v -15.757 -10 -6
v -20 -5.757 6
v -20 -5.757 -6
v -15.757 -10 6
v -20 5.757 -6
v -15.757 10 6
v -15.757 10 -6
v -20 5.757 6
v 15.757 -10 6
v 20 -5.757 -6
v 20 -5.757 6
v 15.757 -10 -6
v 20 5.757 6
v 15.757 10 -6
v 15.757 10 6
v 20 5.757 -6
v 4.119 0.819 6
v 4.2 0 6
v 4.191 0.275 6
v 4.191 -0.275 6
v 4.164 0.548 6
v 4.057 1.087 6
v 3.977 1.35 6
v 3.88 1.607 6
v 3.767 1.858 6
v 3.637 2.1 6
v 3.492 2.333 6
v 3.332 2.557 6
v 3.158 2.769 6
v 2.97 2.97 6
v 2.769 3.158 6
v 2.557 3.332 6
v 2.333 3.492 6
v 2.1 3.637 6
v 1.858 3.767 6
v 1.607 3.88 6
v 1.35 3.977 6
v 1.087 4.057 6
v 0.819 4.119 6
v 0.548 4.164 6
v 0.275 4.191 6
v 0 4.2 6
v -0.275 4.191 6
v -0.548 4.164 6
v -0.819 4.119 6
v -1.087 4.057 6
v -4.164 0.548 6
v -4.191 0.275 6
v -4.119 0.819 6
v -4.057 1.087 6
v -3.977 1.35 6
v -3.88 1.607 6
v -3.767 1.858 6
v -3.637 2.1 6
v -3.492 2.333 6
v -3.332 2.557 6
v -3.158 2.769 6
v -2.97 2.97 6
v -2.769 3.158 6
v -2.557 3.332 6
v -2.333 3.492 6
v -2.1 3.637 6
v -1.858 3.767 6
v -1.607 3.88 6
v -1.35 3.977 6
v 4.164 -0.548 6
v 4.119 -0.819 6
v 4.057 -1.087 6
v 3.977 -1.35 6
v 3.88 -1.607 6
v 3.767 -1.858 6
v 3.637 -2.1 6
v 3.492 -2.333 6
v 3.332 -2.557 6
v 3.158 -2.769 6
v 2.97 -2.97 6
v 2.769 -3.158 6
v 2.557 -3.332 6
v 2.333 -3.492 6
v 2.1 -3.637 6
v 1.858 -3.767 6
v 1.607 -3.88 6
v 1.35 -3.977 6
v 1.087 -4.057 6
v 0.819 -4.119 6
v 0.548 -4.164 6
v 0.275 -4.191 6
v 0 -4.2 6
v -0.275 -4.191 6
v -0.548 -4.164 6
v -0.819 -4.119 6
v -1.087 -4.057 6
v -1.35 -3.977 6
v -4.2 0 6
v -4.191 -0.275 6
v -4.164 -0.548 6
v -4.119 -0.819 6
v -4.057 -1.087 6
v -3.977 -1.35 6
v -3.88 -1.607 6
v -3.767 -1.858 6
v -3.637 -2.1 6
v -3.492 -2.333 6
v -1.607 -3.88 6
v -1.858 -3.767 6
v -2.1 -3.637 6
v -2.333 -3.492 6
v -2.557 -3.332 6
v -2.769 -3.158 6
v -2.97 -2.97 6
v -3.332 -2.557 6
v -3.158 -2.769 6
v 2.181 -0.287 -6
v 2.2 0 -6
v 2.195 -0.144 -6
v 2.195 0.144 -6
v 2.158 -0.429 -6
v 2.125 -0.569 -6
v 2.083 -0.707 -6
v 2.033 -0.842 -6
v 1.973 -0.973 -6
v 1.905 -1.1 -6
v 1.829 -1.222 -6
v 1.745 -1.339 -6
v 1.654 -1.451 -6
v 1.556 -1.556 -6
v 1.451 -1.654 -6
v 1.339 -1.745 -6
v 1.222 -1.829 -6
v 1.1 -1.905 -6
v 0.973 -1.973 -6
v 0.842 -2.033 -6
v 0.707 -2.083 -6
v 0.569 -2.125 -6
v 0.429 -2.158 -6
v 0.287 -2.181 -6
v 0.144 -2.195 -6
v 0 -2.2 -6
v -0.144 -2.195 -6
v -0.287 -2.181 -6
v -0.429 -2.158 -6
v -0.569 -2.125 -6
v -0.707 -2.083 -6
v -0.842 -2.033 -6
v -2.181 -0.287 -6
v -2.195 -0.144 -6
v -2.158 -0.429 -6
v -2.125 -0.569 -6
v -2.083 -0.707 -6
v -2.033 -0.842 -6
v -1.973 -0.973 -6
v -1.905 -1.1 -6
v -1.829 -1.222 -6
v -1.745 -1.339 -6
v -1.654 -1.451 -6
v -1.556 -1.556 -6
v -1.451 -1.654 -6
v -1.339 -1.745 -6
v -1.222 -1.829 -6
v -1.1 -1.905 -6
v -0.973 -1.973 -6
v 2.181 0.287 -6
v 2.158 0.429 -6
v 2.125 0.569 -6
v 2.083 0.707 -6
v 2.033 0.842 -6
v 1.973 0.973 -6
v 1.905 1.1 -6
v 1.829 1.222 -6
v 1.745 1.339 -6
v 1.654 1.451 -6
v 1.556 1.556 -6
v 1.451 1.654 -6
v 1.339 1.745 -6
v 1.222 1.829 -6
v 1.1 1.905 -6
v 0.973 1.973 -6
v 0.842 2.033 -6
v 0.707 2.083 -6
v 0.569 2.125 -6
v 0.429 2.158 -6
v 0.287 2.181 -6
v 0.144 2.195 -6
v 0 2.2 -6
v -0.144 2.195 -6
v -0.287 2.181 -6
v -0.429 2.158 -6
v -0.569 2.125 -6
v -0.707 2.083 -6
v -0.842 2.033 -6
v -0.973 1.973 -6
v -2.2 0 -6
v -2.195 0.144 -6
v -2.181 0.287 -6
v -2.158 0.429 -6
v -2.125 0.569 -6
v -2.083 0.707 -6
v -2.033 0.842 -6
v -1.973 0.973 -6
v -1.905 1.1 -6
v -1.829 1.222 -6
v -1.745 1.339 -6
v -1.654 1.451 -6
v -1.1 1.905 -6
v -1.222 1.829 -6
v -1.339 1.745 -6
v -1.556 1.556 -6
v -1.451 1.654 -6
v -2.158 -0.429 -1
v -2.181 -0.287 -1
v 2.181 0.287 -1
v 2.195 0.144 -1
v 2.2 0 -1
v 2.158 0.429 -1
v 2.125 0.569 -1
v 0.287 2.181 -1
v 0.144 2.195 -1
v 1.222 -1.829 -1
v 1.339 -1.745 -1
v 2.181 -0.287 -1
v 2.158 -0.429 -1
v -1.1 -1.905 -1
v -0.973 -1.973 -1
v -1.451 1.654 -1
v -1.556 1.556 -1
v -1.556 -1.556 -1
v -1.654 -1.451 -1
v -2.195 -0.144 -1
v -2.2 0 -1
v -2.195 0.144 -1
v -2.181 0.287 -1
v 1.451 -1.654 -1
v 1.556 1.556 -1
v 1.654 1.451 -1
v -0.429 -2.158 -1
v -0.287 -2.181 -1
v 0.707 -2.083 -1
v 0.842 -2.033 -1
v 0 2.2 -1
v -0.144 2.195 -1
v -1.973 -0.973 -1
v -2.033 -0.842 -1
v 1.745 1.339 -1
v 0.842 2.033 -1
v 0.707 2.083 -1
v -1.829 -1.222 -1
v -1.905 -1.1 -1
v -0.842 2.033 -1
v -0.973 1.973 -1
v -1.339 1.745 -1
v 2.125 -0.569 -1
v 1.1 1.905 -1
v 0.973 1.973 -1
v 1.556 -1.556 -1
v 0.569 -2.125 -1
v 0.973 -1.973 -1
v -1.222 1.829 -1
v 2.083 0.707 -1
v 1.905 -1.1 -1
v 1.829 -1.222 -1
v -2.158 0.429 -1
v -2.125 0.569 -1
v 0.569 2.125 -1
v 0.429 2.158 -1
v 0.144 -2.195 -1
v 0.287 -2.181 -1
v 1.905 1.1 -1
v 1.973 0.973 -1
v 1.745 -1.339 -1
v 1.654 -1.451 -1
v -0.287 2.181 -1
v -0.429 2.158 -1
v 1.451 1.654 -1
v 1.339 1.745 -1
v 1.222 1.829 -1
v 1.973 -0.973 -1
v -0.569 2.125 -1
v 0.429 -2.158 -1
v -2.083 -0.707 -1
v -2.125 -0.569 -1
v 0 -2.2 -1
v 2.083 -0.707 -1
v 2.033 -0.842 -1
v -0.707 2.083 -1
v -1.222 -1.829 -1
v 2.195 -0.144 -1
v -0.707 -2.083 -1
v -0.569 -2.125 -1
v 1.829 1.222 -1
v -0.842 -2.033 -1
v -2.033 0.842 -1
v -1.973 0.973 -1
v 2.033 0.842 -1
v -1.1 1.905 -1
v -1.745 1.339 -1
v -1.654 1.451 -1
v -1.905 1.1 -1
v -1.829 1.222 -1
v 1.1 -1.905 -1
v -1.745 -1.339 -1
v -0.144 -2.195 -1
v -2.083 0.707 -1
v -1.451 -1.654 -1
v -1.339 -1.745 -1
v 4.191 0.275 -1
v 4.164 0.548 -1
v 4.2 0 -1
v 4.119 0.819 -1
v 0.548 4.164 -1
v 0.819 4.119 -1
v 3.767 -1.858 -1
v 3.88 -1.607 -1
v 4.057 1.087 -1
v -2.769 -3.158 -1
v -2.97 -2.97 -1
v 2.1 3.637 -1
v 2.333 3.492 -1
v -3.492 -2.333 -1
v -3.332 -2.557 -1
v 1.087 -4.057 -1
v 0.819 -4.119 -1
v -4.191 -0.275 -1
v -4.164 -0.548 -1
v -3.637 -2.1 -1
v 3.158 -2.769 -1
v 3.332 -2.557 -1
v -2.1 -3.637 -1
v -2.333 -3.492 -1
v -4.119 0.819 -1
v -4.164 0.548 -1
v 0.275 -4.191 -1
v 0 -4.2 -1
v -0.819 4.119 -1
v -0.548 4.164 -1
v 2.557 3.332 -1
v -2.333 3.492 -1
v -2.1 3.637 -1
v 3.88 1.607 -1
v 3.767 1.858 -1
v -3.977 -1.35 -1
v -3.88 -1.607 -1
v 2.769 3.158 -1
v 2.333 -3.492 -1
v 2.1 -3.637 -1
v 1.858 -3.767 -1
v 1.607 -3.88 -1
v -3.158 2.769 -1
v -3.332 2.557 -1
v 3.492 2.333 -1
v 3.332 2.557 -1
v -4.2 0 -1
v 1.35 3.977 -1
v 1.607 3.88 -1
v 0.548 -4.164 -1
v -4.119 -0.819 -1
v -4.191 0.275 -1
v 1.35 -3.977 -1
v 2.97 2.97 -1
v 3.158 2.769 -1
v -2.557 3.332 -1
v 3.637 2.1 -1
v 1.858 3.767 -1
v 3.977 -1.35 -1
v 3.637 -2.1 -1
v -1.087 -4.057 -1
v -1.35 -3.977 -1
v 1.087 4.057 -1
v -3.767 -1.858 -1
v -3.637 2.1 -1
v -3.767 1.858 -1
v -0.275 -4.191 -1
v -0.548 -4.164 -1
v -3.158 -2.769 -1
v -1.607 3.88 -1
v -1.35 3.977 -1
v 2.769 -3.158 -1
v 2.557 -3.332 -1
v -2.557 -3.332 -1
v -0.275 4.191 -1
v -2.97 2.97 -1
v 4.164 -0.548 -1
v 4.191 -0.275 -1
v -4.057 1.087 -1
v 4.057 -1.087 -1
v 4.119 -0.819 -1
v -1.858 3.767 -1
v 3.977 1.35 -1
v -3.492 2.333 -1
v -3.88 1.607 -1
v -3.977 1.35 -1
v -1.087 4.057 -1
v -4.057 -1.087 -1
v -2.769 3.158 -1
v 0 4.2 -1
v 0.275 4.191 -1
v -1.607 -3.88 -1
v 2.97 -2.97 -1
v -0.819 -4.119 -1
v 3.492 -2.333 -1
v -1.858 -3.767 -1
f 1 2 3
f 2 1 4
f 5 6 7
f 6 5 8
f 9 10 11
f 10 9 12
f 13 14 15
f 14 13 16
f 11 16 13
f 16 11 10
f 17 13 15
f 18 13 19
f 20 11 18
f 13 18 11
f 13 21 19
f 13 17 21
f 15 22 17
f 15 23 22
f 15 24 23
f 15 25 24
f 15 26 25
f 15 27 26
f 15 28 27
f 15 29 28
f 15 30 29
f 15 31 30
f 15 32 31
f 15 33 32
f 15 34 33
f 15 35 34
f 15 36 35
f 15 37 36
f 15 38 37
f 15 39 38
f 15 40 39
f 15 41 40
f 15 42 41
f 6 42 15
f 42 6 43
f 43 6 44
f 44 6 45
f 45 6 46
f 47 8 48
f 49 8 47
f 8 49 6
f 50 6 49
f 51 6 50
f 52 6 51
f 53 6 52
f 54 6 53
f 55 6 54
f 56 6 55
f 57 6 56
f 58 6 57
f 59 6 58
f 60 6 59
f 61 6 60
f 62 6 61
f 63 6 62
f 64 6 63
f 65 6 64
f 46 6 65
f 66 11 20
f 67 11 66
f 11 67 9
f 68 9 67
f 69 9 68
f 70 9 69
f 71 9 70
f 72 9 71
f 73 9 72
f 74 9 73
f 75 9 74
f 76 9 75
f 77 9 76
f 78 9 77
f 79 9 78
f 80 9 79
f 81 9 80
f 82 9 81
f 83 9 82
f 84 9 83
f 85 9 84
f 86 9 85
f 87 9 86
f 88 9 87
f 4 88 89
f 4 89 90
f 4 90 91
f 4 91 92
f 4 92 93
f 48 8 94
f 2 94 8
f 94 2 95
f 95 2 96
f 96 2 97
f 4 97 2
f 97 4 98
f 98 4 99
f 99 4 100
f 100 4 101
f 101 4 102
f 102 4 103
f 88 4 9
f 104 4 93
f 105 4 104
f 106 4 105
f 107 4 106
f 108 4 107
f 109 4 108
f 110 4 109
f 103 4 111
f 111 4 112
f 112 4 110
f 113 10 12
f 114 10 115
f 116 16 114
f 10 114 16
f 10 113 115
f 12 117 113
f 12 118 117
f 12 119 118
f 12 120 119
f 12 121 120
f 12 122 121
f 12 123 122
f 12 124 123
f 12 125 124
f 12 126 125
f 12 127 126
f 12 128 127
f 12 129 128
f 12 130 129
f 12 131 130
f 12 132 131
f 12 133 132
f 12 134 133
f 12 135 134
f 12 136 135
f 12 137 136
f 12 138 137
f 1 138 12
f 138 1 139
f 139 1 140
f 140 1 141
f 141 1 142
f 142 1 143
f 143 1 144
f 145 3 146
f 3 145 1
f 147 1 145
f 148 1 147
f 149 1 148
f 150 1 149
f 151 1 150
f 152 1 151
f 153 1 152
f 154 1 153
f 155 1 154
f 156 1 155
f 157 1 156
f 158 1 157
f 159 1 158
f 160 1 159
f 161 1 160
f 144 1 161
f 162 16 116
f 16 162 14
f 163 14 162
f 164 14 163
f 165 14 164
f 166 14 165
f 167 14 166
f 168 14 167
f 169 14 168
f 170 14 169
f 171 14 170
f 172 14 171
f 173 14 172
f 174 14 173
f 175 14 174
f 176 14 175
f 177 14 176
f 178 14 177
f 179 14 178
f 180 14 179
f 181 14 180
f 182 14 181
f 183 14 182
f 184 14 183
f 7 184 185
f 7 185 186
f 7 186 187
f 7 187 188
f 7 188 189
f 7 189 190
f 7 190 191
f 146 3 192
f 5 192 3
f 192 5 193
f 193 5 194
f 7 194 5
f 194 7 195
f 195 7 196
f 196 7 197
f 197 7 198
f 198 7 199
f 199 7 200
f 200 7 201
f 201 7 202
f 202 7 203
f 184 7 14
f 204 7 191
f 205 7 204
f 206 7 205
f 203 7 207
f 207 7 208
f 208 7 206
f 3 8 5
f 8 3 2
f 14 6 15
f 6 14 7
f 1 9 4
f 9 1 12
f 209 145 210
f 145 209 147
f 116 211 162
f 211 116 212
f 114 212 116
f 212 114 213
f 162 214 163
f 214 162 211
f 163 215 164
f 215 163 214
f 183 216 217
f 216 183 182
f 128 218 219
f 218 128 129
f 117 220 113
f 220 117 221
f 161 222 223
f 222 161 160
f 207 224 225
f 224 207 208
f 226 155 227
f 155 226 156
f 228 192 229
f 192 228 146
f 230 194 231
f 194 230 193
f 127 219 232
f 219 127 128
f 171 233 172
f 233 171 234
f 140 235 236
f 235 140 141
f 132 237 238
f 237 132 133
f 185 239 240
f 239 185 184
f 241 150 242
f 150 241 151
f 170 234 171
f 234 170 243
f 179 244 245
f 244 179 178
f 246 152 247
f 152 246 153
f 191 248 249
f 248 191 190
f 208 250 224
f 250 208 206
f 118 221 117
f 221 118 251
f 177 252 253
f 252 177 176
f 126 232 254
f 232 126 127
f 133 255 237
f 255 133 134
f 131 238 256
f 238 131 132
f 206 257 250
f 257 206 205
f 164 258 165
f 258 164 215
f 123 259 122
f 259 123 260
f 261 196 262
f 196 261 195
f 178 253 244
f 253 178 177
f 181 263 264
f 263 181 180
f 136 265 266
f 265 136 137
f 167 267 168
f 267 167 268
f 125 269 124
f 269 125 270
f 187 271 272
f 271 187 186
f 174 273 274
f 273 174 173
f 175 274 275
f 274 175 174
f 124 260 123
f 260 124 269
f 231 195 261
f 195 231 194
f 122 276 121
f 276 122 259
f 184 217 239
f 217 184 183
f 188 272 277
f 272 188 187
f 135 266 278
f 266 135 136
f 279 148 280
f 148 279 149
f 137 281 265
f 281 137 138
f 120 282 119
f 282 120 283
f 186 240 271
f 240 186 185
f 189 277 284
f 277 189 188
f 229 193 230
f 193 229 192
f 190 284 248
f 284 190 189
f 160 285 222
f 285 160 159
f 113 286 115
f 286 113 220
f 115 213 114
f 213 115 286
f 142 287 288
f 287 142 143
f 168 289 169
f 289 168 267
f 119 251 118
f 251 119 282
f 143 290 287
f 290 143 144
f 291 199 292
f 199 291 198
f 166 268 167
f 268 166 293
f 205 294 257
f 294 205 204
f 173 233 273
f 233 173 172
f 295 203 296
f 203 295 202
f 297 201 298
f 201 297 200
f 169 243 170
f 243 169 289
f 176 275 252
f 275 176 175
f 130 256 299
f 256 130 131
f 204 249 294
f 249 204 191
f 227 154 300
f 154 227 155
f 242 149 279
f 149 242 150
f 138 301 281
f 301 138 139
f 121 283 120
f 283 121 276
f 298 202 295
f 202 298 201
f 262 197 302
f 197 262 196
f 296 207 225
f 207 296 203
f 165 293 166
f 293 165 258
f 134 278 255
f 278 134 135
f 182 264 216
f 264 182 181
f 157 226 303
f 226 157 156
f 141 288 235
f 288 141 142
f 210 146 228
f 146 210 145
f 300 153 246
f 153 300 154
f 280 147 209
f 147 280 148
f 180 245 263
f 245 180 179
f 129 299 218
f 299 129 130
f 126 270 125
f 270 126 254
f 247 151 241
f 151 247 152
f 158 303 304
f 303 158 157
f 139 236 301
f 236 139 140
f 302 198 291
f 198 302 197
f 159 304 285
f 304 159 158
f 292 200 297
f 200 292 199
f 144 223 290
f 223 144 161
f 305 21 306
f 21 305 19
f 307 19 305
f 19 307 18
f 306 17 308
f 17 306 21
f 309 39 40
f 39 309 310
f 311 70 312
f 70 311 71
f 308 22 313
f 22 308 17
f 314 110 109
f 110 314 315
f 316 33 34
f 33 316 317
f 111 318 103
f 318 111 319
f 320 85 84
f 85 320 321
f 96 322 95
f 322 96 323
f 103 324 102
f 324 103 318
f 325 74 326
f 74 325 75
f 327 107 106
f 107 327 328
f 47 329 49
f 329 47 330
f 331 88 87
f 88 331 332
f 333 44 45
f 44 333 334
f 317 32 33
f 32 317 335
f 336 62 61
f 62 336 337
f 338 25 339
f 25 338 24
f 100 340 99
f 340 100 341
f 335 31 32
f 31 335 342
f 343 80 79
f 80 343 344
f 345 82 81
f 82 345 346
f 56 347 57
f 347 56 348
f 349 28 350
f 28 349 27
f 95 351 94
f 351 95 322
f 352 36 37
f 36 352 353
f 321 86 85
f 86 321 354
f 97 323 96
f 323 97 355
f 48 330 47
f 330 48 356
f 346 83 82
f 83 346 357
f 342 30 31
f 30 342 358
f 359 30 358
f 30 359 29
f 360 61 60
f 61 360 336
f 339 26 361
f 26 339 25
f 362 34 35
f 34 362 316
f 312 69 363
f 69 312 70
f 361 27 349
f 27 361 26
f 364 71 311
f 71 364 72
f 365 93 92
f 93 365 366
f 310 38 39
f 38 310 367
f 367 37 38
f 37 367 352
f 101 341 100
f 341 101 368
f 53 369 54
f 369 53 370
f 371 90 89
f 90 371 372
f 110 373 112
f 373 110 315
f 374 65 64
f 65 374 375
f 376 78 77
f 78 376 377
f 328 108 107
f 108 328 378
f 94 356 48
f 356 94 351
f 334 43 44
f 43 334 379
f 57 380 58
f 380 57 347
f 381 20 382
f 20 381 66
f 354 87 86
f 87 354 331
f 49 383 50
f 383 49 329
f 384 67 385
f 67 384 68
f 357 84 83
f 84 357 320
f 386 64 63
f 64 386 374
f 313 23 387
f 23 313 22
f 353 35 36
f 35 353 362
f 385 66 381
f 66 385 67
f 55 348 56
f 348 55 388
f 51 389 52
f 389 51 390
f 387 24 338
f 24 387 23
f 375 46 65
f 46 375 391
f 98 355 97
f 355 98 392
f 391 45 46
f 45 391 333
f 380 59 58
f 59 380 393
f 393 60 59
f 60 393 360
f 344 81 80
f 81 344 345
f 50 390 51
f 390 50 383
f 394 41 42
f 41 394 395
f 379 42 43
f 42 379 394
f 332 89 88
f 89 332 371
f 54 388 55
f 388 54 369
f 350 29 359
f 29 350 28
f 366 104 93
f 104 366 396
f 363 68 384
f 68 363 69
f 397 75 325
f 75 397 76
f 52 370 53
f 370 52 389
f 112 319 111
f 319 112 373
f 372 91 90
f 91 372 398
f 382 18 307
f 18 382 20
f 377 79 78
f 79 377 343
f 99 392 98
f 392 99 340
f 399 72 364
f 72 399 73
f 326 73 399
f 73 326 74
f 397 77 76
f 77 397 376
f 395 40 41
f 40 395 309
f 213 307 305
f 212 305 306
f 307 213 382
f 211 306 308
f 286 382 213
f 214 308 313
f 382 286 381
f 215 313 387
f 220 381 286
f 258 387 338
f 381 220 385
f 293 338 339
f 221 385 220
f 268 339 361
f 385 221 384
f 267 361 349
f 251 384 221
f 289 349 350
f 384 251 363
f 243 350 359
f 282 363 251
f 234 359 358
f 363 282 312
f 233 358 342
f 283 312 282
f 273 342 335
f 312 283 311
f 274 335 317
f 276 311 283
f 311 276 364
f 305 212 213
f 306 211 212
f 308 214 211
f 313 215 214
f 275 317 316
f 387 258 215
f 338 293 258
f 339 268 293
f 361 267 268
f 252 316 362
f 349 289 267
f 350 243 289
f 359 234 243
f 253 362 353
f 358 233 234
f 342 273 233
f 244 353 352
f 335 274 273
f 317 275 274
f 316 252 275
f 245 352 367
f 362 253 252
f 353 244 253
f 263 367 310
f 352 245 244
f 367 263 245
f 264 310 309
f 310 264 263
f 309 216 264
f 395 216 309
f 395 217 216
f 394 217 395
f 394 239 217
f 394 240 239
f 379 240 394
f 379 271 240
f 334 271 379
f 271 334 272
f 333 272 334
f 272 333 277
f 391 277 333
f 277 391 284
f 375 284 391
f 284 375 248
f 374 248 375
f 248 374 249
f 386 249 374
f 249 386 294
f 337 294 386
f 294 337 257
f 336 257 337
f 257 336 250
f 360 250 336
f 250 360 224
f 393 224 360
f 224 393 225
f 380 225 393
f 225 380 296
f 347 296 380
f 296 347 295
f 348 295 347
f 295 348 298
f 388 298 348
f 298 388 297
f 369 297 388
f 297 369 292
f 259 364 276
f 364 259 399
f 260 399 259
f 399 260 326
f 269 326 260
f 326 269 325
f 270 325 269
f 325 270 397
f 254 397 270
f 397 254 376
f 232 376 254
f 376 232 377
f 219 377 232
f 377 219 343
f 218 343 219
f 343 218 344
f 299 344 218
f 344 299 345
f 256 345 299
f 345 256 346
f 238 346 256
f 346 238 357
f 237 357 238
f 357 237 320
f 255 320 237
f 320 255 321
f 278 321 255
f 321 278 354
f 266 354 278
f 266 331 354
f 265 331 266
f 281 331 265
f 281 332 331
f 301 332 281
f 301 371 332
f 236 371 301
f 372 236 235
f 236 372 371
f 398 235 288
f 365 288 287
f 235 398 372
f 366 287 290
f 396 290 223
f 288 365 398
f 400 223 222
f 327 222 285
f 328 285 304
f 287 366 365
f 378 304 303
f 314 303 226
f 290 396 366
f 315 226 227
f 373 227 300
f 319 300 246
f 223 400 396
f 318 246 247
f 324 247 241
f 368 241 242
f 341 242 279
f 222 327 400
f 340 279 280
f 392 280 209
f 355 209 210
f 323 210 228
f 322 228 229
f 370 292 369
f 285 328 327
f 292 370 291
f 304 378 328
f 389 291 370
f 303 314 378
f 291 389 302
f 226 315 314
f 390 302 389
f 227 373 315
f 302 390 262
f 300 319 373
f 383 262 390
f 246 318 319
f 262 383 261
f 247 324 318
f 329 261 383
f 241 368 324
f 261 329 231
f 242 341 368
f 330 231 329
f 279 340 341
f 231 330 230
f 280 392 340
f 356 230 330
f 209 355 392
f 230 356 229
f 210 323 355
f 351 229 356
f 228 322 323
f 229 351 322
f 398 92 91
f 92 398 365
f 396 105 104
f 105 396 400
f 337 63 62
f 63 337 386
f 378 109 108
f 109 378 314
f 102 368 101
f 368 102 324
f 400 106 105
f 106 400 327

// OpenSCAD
$fn=96;

// Minimal "component": a small mounting block with a through-hole and a counterbore.
module component() {
    difference() {
        // Main body
        cube([40, 20, 12], center=true);

        // Through hole (M4-ish)
        translate([0, 0, 0])
            cylinder(h=30, r=2.2, center=true);

        // Counterbore on top
        translate([0, 0, 4])
            cylinder(h=10, r=4.2, center=true);

        // Light chamfer-ish edge relief (simple)
        for (sx=[-1,1], sy=[-1,1]) {
            translate([sx*20, sy*10, 0])
                rotate([0,0,45])
                    cube([6,6,30], center=true);
        }
    }
}

component();
